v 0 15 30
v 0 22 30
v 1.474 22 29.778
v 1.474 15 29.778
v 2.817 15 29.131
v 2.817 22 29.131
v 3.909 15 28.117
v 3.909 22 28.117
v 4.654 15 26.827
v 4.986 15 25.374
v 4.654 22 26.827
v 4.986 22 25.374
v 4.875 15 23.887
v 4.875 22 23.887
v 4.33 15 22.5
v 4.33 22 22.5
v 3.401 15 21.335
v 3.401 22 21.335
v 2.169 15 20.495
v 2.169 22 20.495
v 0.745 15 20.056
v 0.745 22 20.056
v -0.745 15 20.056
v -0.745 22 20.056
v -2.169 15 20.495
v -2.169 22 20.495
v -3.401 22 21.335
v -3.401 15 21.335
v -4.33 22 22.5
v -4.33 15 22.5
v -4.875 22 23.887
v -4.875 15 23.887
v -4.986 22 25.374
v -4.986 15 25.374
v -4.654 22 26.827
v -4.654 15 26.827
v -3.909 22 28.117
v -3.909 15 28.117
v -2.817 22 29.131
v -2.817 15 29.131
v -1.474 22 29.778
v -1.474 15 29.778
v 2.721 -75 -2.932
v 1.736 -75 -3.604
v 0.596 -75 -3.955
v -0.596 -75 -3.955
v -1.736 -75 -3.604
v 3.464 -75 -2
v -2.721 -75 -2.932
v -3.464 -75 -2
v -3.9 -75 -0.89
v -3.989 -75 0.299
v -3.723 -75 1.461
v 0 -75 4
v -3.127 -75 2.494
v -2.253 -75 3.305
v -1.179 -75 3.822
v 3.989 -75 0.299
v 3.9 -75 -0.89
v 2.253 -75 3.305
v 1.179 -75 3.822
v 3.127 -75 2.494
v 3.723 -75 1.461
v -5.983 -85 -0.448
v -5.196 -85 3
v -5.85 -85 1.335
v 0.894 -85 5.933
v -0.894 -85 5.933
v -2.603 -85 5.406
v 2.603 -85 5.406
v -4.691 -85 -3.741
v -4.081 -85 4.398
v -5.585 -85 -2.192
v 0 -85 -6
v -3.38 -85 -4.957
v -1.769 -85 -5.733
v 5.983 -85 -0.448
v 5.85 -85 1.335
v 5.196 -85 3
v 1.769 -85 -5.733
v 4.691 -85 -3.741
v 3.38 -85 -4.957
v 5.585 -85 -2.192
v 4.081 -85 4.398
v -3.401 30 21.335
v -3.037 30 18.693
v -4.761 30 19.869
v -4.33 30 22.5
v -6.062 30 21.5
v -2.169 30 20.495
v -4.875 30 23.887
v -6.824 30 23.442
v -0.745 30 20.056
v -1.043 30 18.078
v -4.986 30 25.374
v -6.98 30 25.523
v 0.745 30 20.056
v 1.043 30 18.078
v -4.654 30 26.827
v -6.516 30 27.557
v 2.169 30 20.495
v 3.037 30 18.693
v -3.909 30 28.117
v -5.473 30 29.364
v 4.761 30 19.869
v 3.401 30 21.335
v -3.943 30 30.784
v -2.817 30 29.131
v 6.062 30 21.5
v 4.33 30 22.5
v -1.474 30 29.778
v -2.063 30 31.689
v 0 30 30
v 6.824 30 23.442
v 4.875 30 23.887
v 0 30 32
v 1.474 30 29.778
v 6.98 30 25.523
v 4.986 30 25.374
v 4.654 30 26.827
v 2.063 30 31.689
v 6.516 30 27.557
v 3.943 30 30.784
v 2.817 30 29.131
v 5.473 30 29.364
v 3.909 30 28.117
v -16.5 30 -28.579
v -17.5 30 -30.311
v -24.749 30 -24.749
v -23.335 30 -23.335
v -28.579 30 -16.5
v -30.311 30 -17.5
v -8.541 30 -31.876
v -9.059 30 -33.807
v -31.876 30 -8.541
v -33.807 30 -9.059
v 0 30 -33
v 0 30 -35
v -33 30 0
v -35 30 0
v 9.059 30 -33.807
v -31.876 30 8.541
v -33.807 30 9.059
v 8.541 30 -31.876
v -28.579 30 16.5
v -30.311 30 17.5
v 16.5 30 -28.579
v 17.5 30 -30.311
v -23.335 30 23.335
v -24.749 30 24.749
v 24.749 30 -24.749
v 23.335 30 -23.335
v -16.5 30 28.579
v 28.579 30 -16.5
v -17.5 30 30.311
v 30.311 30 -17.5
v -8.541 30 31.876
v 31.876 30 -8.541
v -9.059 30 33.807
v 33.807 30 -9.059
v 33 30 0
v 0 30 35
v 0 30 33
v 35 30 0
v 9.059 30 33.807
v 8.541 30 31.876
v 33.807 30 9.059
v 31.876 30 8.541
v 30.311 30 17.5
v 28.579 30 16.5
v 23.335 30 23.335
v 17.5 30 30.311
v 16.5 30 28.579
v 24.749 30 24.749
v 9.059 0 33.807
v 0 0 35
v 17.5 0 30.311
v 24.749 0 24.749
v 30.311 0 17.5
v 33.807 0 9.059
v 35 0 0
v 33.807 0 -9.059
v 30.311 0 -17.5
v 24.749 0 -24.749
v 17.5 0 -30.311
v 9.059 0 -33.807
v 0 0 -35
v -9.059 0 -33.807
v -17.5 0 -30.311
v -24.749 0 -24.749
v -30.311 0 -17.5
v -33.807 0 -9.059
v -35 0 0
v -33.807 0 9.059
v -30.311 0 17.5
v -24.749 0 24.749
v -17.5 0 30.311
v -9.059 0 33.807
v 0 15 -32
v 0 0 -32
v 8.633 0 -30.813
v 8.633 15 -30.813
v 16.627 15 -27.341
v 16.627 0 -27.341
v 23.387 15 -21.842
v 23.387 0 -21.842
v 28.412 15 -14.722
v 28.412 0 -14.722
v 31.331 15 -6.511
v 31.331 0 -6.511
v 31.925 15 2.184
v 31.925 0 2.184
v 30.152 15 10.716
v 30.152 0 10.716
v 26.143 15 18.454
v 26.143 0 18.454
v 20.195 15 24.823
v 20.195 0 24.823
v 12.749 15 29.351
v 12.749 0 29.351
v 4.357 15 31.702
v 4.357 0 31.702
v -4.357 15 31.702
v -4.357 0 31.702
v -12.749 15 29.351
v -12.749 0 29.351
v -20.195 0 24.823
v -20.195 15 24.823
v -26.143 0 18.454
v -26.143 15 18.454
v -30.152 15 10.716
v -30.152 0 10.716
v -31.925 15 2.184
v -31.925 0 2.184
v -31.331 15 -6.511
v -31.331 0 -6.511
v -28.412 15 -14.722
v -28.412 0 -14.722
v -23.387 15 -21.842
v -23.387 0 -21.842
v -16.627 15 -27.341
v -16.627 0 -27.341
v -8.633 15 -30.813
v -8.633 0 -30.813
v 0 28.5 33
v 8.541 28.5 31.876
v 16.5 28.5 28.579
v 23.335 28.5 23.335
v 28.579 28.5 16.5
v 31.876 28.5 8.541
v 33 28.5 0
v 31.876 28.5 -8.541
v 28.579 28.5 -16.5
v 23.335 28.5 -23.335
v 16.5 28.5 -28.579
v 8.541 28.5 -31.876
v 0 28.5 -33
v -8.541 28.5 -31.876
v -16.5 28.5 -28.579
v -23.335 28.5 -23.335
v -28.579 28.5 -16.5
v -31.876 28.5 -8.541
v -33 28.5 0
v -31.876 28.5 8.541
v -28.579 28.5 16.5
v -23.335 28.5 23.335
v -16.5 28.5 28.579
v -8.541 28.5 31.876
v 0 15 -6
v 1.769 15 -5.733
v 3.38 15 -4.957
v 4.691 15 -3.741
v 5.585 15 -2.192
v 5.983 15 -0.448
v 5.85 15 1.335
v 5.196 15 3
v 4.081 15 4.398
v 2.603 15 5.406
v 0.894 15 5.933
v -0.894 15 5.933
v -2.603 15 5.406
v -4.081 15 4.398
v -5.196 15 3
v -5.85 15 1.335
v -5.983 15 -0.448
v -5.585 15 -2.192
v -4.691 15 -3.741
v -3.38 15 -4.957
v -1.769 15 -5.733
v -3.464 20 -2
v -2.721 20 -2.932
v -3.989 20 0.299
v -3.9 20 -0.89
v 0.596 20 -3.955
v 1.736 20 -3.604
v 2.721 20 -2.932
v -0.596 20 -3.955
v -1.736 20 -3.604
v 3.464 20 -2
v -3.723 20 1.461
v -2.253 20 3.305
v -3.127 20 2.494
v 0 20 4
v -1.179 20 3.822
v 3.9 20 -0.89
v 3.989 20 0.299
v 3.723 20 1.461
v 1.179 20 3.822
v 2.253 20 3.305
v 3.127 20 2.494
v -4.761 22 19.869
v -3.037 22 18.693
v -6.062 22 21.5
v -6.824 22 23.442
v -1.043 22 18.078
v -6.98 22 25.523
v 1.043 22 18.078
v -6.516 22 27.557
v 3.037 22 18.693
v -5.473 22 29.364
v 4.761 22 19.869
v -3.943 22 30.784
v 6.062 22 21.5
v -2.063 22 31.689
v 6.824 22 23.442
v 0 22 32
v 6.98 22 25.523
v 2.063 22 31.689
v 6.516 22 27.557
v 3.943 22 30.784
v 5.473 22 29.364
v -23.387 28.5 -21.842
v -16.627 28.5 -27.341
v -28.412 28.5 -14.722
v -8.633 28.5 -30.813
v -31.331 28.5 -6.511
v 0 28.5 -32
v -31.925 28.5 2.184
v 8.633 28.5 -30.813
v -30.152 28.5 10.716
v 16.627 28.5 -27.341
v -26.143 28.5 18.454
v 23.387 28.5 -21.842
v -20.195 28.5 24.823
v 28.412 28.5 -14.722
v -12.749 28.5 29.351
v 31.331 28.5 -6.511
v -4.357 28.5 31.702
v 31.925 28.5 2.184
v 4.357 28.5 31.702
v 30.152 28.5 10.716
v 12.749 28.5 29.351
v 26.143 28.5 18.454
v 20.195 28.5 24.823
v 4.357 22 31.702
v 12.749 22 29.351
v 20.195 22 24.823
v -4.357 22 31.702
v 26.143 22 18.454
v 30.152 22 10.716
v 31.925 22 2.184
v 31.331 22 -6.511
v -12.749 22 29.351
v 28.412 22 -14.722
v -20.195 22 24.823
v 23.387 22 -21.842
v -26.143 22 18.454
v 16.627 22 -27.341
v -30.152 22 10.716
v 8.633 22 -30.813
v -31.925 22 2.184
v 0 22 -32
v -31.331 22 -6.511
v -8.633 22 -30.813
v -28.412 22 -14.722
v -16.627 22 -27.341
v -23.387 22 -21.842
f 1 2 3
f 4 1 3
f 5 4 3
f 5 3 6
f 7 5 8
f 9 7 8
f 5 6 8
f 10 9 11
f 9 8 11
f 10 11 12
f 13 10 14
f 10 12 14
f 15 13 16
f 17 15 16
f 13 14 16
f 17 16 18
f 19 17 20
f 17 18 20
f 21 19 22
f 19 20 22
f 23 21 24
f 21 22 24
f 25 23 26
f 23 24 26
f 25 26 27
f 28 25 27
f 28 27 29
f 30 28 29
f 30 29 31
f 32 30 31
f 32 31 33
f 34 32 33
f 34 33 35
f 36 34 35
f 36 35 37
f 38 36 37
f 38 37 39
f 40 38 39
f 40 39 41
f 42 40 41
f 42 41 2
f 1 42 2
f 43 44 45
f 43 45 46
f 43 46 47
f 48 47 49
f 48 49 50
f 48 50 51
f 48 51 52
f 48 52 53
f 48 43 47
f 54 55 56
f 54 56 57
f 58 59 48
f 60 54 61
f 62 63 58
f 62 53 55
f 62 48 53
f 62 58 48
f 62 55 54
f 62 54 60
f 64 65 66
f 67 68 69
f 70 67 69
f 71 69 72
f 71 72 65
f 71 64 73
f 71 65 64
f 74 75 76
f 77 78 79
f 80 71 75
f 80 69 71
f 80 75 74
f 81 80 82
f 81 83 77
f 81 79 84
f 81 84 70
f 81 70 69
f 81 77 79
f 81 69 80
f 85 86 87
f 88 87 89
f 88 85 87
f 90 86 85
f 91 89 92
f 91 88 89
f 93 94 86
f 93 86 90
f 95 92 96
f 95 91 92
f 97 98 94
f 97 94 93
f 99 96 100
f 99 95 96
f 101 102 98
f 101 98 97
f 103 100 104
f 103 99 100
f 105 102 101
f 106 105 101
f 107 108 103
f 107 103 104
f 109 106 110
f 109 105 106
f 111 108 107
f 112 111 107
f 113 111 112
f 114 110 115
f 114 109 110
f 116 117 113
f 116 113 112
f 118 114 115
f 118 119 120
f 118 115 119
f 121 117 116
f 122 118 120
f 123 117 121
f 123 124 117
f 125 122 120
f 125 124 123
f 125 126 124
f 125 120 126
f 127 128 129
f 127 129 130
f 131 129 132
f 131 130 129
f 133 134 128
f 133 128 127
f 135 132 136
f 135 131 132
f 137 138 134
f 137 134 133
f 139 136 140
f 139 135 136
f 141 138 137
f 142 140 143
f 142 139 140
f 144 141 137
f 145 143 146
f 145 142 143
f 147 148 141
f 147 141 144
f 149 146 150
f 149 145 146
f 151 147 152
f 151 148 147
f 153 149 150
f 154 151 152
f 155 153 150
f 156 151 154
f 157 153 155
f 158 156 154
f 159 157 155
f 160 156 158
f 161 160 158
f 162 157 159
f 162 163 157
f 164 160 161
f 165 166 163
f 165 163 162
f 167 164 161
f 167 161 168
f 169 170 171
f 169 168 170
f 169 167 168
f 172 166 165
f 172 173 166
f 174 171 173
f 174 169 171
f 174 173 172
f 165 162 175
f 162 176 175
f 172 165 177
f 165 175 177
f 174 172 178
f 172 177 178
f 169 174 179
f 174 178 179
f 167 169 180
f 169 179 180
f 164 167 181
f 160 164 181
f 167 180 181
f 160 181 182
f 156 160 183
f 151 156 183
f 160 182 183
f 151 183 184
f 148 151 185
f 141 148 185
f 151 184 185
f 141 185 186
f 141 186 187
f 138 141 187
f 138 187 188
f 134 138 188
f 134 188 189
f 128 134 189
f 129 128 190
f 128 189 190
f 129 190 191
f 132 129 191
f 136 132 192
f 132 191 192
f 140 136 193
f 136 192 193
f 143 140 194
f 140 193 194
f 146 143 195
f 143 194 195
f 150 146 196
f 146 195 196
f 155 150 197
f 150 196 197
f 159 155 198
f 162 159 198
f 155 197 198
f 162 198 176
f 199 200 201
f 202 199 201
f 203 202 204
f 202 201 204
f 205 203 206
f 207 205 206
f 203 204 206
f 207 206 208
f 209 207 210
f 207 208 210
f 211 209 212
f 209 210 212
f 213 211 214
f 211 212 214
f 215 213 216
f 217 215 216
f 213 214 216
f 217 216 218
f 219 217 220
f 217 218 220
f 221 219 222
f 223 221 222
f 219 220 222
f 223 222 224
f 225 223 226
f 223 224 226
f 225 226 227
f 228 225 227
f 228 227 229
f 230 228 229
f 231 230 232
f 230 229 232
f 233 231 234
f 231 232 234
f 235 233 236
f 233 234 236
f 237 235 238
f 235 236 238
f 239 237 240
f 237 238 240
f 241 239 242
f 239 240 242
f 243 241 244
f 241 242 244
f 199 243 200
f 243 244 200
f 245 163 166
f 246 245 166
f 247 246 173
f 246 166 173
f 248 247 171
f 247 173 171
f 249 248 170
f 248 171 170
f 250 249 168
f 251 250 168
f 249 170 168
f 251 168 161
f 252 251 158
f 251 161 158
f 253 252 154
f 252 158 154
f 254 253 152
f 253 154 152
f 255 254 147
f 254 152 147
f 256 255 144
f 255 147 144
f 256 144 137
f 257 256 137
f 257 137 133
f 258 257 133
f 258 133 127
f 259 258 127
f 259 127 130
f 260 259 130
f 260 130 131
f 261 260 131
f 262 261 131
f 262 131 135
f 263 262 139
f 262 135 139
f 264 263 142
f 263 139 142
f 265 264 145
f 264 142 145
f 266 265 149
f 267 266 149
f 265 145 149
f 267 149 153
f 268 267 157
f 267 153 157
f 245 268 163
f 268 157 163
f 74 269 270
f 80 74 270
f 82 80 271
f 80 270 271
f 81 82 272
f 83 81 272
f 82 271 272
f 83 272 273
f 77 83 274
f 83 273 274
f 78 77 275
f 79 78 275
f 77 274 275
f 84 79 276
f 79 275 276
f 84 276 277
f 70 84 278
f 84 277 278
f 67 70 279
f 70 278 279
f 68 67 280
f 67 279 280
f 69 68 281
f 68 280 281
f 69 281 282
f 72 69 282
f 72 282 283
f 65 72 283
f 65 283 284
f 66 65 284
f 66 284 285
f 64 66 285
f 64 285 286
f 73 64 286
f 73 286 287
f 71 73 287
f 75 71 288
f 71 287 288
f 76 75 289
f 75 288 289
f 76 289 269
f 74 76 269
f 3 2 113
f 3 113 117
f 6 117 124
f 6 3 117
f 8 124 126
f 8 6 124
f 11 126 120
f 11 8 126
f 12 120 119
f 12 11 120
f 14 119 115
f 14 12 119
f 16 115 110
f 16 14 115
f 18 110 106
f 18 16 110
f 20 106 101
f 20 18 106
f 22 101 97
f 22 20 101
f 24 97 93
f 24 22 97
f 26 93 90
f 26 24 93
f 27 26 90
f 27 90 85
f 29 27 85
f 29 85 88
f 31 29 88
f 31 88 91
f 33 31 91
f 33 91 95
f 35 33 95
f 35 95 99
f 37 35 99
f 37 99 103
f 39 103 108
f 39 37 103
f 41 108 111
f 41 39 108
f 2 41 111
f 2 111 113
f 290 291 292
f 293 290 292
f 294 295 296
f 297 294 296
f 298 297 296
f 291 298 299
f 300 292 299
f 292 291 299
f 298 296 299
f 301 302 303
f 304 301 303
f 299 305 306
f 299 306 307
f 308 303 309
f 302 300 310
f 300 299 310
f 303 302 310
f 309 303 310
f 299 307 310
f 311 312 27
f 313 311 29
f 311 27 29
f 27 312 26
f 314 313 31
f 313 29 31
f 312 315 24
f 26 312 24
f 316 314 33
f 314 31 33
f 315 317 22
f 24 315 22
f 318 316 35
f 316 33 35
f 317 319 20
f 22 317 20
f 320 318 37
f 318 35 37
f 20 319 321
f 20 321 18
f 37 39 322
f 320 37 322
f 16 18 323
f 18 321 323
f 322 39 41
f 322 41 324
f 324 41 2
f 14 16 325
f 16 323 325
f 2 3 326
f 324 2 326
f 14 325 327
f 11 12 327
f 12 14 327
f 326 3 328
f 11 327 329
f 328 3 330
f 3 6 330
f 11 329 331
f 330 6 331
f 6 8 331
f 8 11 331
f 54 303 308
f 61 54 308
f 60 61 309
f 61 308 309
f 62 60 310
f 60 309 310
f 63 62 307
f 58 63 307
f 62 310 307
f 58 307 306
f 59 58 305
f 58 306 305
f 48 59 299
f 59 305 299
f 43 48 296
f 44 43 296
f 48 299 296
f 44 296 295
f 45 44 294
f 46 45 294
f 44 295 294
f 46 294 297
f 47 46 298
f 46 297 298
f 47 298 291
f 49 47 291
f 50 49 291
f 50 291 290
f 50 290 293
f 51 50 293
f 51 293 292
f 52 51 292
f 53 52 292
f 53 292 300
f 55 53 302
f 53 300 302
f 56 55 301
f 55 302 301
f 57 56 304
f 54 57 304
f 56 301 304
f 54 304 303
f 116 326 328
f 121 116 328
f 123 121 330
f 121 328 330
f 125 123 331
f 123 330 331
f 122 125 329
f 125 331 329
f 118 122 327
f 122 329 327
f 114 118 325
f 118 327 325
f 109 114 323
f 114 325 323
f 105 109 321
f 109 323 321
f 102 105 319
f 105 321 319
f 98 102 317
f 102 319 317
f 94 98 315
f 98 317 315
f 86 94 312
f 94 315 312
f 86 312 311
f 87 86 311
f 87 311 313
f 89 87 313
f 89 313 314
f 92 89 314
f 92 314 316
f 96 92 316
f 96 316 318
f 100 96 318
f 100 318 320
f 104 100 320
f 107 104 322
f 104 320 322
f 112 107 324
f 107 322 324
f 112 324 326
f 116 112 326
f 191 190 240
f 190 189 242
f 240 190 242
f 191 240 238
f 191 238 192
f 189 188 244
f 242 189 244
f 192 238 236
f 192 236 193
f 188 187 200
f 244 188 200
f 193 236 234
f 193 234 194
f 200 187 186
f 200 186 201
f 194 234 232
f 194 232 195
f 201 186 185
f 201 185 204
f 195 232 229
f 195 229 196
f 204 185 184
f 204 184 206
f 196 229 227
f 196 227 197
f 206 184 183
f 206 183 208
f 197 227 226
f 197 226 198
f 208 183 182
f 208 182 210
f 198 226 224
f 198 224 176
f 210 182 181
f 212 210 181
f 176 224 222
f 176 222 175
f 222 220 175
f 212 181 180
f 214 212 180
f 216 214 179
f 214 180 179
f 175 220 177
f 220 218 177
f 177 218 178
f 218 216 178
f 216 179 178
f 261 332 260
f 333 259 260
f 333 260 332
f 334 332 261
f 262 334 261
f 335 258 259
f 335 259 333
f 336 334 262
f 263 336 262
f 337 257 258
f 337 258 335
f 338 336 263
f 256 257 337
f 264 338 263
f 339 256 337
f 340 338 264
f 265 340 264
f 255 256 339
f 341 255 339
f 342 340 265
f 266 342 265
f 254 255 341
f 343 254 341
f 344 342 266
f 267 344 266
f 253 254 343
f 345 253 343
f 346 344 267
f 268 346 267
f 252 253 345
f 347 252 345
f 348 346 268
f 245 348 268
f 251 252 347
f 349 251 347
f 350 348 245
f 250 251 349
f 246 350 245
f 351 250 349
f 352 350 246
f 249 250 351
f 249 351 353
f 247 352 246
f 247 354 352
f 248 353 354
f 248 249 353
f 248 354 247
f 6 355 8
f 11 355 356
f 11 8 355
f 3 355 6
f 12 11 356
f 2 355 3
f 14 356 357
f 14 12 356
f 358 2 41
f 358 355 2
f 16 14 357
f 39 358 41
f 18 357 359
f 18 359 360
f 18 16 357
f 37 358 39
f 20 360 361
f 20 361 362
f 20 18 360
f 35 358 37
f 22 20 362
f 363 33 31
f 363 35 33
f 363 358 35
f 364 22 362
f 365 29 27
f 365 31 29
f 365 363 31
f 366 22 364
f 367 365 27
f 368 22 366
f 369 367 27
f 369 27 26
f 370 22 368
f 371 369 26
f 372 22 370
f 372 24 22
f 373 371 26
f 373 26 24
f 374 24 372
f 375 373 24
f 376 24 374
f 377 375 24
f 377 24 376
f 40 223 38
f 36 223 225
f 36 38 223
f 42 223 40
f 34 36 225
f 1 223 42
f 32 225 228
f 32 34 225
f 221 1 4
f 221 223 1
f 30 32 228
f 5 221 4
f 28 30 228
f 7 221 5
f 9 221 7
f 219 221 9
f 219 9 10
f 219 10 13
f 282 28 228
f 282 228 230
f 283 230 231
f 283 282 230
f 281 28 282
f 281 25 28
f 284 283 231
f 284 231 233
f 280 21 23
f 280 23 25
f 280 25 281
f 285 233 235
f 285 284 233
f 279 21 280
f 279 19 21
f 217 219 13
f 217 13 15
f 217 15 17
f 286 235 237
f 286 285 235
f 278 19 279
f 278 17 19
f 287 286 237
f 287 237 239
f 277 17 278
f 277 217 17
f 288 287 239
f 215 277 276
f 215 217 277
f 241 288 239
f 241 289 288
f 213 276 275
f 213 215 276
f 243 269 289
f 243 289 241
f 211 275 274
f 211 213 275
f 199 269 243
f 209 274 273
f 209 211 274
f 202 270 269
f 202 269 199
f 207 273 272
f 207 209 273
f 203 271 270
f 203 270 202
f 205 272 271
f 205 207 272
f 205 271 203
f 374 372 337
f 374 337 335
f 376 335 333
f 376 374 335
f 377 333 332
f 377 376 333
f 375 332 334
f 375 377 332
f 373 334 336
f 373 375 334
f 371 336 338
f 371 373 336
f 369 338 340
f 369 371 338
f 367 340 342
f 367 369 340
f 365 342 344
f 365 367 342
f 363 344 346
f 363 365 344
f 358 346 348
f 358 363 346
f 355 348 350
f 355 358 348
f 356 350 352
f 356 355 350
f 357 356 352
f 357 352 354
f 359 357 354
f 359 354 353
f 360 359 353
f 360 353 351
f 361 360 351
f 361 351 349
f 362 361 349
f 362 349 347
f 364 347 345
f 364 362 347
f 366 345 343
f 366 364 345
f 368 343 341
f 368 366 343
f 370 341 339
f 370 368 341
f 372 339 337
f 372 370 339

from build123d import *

# Parameters (mm, degrees)
SKETCH2_R            = 35
BOSS_EXTRUDE2_DEPTH  = 20
SKETCH3_R            = 32
CUT_EXTRUDE1_DEPTH   = 15
SKETCH4_R            = 6
BOSS_EXTRUDE3_DEPTH  = 100
SKETCH6_R            = 4
CUT_EXTRUDE3_DEPTH   = 95
SKETCH8_R            = 35
BOSS_EXTRUDE4_DEPTH  = 10
CUT_EXTRUDE4_START   = -8
SKETCH9_R            = 32
CUT_EXTRUDE4_DEPTH   = 8
SKETCH10_R           = 33
SKETCH10_R_2         = 31
CUT_EXTRUDE5_DEPTH   = 1.5
SKETCH11_R           = 5
CUT_EXTRUDE6_DEPTH   = 118.894020205
SKETCH13_R           = 7
SKETCH13_R_2         = 5
BOSS_EXTRUDE16_DEPTH = 8


with BuildPart() as part:
    # Sketch2 → Boss-Extrude2 (new body)
    with BuildSketch(Plane(origin=(0, 0, 0), x_dir=(1, 0, 0), z_dir=(0, 1, 0))):
        with Locations(Location((0, 0, 0), (0, 0, 270))):
            Circle(SKETCH2_R)
    extrude(amount=BOSS_EXTRUDE2_DEPTH)

    # Sketch3 → Cut-Extrude1 (cut)
    with BuildSketch(Plane.XZ):
        with Locations(Location((0, 0, 0), (0, 0, 270))):
            Circle(SKETCH3_R)
    extrude(amount=-CUT_EXTRUDE1_DEPTH, mode=Mode.SUBTRACT)

    # Sketch4 → Boss-Extrude3 (add)
    with BuildSketch(Plane.XZ.offset(-15)):
        with Locations(Location((0, 0, 0), (0, 0, 270))):
            Circle(SKETCH4_R)
    extrude(amount=BOSS_EXTRUDE3_DEPTH)

    # Sketch6 → Cut-Extrude3 (cut)
    with BuildSketch(Plane(origin=(0, 20, 0), x_dir=(1, 0, 0), z_dir=(0, 1, 0))):
        with Locations(Location((0, 0, 0), (0, 0, 270))):
            Circle(SKETCH6_R)
    extrude(amount=-CUT_EXTRUDE3_DEPTH, mode=Mode.SUBTRACT)

    # Sketch8 → Boss-Extrude4 (add)
    with BuildSketch(Plane(origin=(0, 20, 0), x_dir=(1, 0, 0), z_dir=(0, 1, 0))):
        with Locations(Location((0, 0, 0), (0, 0, 270))):
            Circle(SKETCH8_R)
    extrude(amount=BOSS_EXTRUDE4_DEPTH)

    # Sketch9 → Cut-Extrude4 (cut)
    with BuildSketch(Plane(origin=(0, 30, 0), x_dir=(1, 0, 0), z_dir=(0, 1, 0)).offset(CUT_EXTRUDE4_START)):
        with Locations(Location((0, 0, 0), (0, 0, 90))):
            Circle(SKETCH9_R)
    extrude(amount=CUT_EXTRUDE4_DEPTH, mode=Mode.SUBTRACT)

    # Sketch10 → Cut-Extrude5 (cut)
    with BuildSketch(Plane(origin=(0, 30, 0), x_dir=(1, 0, 0), z_dir=(0, 1, 0))):
        with Locations(Location((0, 0, 0), (0, 0, 270))):
            Circle(SKETCH10_R)
        Circle(SKETCH10_R_2, mode=Mode.SUBTRACT)
    extrude(amount=-CUT_EXTRUDE5_DEPTH, mode=Mode.SUBTRACT)

    # Sketch11 → Cut-Extrude6 (cut, through all)
    with BuildSketch(Plane(origin=(0, 22, 0), x_dir=(1, 0, 0), z_dir=(0, 1, 0))):
        with Locations(Location((0, -25, 0), (0, 0, 270))):
            Circle(SKETCH11_R)
    extrude(amount=-CUT_EXTRUDE6_DEPTH, mode=Mode.SUBTRACT)


with BuildPart() as body_2:
    # Sketch13 → Boss-Extrude16 (new body)
    with BuildSketch(Plane(origin=(0, 22, 0), x_dir=(1, 0, 0), z_dir=(0, 1, 0))):
        with Locations(Location((0, -25, 0), (0, 0, 270))):
            Circle(SKETCH13_R)
        with Locations(Location((0, -25, 0), (0, 0, 270))):
            Circle(SKETCH13_R_2, mode=Mode.SUBTRACT)
    extrude(amount=BOSS_EXTRUDE16_DEPTH)


solid = Compound([part.part, body_2.part])
